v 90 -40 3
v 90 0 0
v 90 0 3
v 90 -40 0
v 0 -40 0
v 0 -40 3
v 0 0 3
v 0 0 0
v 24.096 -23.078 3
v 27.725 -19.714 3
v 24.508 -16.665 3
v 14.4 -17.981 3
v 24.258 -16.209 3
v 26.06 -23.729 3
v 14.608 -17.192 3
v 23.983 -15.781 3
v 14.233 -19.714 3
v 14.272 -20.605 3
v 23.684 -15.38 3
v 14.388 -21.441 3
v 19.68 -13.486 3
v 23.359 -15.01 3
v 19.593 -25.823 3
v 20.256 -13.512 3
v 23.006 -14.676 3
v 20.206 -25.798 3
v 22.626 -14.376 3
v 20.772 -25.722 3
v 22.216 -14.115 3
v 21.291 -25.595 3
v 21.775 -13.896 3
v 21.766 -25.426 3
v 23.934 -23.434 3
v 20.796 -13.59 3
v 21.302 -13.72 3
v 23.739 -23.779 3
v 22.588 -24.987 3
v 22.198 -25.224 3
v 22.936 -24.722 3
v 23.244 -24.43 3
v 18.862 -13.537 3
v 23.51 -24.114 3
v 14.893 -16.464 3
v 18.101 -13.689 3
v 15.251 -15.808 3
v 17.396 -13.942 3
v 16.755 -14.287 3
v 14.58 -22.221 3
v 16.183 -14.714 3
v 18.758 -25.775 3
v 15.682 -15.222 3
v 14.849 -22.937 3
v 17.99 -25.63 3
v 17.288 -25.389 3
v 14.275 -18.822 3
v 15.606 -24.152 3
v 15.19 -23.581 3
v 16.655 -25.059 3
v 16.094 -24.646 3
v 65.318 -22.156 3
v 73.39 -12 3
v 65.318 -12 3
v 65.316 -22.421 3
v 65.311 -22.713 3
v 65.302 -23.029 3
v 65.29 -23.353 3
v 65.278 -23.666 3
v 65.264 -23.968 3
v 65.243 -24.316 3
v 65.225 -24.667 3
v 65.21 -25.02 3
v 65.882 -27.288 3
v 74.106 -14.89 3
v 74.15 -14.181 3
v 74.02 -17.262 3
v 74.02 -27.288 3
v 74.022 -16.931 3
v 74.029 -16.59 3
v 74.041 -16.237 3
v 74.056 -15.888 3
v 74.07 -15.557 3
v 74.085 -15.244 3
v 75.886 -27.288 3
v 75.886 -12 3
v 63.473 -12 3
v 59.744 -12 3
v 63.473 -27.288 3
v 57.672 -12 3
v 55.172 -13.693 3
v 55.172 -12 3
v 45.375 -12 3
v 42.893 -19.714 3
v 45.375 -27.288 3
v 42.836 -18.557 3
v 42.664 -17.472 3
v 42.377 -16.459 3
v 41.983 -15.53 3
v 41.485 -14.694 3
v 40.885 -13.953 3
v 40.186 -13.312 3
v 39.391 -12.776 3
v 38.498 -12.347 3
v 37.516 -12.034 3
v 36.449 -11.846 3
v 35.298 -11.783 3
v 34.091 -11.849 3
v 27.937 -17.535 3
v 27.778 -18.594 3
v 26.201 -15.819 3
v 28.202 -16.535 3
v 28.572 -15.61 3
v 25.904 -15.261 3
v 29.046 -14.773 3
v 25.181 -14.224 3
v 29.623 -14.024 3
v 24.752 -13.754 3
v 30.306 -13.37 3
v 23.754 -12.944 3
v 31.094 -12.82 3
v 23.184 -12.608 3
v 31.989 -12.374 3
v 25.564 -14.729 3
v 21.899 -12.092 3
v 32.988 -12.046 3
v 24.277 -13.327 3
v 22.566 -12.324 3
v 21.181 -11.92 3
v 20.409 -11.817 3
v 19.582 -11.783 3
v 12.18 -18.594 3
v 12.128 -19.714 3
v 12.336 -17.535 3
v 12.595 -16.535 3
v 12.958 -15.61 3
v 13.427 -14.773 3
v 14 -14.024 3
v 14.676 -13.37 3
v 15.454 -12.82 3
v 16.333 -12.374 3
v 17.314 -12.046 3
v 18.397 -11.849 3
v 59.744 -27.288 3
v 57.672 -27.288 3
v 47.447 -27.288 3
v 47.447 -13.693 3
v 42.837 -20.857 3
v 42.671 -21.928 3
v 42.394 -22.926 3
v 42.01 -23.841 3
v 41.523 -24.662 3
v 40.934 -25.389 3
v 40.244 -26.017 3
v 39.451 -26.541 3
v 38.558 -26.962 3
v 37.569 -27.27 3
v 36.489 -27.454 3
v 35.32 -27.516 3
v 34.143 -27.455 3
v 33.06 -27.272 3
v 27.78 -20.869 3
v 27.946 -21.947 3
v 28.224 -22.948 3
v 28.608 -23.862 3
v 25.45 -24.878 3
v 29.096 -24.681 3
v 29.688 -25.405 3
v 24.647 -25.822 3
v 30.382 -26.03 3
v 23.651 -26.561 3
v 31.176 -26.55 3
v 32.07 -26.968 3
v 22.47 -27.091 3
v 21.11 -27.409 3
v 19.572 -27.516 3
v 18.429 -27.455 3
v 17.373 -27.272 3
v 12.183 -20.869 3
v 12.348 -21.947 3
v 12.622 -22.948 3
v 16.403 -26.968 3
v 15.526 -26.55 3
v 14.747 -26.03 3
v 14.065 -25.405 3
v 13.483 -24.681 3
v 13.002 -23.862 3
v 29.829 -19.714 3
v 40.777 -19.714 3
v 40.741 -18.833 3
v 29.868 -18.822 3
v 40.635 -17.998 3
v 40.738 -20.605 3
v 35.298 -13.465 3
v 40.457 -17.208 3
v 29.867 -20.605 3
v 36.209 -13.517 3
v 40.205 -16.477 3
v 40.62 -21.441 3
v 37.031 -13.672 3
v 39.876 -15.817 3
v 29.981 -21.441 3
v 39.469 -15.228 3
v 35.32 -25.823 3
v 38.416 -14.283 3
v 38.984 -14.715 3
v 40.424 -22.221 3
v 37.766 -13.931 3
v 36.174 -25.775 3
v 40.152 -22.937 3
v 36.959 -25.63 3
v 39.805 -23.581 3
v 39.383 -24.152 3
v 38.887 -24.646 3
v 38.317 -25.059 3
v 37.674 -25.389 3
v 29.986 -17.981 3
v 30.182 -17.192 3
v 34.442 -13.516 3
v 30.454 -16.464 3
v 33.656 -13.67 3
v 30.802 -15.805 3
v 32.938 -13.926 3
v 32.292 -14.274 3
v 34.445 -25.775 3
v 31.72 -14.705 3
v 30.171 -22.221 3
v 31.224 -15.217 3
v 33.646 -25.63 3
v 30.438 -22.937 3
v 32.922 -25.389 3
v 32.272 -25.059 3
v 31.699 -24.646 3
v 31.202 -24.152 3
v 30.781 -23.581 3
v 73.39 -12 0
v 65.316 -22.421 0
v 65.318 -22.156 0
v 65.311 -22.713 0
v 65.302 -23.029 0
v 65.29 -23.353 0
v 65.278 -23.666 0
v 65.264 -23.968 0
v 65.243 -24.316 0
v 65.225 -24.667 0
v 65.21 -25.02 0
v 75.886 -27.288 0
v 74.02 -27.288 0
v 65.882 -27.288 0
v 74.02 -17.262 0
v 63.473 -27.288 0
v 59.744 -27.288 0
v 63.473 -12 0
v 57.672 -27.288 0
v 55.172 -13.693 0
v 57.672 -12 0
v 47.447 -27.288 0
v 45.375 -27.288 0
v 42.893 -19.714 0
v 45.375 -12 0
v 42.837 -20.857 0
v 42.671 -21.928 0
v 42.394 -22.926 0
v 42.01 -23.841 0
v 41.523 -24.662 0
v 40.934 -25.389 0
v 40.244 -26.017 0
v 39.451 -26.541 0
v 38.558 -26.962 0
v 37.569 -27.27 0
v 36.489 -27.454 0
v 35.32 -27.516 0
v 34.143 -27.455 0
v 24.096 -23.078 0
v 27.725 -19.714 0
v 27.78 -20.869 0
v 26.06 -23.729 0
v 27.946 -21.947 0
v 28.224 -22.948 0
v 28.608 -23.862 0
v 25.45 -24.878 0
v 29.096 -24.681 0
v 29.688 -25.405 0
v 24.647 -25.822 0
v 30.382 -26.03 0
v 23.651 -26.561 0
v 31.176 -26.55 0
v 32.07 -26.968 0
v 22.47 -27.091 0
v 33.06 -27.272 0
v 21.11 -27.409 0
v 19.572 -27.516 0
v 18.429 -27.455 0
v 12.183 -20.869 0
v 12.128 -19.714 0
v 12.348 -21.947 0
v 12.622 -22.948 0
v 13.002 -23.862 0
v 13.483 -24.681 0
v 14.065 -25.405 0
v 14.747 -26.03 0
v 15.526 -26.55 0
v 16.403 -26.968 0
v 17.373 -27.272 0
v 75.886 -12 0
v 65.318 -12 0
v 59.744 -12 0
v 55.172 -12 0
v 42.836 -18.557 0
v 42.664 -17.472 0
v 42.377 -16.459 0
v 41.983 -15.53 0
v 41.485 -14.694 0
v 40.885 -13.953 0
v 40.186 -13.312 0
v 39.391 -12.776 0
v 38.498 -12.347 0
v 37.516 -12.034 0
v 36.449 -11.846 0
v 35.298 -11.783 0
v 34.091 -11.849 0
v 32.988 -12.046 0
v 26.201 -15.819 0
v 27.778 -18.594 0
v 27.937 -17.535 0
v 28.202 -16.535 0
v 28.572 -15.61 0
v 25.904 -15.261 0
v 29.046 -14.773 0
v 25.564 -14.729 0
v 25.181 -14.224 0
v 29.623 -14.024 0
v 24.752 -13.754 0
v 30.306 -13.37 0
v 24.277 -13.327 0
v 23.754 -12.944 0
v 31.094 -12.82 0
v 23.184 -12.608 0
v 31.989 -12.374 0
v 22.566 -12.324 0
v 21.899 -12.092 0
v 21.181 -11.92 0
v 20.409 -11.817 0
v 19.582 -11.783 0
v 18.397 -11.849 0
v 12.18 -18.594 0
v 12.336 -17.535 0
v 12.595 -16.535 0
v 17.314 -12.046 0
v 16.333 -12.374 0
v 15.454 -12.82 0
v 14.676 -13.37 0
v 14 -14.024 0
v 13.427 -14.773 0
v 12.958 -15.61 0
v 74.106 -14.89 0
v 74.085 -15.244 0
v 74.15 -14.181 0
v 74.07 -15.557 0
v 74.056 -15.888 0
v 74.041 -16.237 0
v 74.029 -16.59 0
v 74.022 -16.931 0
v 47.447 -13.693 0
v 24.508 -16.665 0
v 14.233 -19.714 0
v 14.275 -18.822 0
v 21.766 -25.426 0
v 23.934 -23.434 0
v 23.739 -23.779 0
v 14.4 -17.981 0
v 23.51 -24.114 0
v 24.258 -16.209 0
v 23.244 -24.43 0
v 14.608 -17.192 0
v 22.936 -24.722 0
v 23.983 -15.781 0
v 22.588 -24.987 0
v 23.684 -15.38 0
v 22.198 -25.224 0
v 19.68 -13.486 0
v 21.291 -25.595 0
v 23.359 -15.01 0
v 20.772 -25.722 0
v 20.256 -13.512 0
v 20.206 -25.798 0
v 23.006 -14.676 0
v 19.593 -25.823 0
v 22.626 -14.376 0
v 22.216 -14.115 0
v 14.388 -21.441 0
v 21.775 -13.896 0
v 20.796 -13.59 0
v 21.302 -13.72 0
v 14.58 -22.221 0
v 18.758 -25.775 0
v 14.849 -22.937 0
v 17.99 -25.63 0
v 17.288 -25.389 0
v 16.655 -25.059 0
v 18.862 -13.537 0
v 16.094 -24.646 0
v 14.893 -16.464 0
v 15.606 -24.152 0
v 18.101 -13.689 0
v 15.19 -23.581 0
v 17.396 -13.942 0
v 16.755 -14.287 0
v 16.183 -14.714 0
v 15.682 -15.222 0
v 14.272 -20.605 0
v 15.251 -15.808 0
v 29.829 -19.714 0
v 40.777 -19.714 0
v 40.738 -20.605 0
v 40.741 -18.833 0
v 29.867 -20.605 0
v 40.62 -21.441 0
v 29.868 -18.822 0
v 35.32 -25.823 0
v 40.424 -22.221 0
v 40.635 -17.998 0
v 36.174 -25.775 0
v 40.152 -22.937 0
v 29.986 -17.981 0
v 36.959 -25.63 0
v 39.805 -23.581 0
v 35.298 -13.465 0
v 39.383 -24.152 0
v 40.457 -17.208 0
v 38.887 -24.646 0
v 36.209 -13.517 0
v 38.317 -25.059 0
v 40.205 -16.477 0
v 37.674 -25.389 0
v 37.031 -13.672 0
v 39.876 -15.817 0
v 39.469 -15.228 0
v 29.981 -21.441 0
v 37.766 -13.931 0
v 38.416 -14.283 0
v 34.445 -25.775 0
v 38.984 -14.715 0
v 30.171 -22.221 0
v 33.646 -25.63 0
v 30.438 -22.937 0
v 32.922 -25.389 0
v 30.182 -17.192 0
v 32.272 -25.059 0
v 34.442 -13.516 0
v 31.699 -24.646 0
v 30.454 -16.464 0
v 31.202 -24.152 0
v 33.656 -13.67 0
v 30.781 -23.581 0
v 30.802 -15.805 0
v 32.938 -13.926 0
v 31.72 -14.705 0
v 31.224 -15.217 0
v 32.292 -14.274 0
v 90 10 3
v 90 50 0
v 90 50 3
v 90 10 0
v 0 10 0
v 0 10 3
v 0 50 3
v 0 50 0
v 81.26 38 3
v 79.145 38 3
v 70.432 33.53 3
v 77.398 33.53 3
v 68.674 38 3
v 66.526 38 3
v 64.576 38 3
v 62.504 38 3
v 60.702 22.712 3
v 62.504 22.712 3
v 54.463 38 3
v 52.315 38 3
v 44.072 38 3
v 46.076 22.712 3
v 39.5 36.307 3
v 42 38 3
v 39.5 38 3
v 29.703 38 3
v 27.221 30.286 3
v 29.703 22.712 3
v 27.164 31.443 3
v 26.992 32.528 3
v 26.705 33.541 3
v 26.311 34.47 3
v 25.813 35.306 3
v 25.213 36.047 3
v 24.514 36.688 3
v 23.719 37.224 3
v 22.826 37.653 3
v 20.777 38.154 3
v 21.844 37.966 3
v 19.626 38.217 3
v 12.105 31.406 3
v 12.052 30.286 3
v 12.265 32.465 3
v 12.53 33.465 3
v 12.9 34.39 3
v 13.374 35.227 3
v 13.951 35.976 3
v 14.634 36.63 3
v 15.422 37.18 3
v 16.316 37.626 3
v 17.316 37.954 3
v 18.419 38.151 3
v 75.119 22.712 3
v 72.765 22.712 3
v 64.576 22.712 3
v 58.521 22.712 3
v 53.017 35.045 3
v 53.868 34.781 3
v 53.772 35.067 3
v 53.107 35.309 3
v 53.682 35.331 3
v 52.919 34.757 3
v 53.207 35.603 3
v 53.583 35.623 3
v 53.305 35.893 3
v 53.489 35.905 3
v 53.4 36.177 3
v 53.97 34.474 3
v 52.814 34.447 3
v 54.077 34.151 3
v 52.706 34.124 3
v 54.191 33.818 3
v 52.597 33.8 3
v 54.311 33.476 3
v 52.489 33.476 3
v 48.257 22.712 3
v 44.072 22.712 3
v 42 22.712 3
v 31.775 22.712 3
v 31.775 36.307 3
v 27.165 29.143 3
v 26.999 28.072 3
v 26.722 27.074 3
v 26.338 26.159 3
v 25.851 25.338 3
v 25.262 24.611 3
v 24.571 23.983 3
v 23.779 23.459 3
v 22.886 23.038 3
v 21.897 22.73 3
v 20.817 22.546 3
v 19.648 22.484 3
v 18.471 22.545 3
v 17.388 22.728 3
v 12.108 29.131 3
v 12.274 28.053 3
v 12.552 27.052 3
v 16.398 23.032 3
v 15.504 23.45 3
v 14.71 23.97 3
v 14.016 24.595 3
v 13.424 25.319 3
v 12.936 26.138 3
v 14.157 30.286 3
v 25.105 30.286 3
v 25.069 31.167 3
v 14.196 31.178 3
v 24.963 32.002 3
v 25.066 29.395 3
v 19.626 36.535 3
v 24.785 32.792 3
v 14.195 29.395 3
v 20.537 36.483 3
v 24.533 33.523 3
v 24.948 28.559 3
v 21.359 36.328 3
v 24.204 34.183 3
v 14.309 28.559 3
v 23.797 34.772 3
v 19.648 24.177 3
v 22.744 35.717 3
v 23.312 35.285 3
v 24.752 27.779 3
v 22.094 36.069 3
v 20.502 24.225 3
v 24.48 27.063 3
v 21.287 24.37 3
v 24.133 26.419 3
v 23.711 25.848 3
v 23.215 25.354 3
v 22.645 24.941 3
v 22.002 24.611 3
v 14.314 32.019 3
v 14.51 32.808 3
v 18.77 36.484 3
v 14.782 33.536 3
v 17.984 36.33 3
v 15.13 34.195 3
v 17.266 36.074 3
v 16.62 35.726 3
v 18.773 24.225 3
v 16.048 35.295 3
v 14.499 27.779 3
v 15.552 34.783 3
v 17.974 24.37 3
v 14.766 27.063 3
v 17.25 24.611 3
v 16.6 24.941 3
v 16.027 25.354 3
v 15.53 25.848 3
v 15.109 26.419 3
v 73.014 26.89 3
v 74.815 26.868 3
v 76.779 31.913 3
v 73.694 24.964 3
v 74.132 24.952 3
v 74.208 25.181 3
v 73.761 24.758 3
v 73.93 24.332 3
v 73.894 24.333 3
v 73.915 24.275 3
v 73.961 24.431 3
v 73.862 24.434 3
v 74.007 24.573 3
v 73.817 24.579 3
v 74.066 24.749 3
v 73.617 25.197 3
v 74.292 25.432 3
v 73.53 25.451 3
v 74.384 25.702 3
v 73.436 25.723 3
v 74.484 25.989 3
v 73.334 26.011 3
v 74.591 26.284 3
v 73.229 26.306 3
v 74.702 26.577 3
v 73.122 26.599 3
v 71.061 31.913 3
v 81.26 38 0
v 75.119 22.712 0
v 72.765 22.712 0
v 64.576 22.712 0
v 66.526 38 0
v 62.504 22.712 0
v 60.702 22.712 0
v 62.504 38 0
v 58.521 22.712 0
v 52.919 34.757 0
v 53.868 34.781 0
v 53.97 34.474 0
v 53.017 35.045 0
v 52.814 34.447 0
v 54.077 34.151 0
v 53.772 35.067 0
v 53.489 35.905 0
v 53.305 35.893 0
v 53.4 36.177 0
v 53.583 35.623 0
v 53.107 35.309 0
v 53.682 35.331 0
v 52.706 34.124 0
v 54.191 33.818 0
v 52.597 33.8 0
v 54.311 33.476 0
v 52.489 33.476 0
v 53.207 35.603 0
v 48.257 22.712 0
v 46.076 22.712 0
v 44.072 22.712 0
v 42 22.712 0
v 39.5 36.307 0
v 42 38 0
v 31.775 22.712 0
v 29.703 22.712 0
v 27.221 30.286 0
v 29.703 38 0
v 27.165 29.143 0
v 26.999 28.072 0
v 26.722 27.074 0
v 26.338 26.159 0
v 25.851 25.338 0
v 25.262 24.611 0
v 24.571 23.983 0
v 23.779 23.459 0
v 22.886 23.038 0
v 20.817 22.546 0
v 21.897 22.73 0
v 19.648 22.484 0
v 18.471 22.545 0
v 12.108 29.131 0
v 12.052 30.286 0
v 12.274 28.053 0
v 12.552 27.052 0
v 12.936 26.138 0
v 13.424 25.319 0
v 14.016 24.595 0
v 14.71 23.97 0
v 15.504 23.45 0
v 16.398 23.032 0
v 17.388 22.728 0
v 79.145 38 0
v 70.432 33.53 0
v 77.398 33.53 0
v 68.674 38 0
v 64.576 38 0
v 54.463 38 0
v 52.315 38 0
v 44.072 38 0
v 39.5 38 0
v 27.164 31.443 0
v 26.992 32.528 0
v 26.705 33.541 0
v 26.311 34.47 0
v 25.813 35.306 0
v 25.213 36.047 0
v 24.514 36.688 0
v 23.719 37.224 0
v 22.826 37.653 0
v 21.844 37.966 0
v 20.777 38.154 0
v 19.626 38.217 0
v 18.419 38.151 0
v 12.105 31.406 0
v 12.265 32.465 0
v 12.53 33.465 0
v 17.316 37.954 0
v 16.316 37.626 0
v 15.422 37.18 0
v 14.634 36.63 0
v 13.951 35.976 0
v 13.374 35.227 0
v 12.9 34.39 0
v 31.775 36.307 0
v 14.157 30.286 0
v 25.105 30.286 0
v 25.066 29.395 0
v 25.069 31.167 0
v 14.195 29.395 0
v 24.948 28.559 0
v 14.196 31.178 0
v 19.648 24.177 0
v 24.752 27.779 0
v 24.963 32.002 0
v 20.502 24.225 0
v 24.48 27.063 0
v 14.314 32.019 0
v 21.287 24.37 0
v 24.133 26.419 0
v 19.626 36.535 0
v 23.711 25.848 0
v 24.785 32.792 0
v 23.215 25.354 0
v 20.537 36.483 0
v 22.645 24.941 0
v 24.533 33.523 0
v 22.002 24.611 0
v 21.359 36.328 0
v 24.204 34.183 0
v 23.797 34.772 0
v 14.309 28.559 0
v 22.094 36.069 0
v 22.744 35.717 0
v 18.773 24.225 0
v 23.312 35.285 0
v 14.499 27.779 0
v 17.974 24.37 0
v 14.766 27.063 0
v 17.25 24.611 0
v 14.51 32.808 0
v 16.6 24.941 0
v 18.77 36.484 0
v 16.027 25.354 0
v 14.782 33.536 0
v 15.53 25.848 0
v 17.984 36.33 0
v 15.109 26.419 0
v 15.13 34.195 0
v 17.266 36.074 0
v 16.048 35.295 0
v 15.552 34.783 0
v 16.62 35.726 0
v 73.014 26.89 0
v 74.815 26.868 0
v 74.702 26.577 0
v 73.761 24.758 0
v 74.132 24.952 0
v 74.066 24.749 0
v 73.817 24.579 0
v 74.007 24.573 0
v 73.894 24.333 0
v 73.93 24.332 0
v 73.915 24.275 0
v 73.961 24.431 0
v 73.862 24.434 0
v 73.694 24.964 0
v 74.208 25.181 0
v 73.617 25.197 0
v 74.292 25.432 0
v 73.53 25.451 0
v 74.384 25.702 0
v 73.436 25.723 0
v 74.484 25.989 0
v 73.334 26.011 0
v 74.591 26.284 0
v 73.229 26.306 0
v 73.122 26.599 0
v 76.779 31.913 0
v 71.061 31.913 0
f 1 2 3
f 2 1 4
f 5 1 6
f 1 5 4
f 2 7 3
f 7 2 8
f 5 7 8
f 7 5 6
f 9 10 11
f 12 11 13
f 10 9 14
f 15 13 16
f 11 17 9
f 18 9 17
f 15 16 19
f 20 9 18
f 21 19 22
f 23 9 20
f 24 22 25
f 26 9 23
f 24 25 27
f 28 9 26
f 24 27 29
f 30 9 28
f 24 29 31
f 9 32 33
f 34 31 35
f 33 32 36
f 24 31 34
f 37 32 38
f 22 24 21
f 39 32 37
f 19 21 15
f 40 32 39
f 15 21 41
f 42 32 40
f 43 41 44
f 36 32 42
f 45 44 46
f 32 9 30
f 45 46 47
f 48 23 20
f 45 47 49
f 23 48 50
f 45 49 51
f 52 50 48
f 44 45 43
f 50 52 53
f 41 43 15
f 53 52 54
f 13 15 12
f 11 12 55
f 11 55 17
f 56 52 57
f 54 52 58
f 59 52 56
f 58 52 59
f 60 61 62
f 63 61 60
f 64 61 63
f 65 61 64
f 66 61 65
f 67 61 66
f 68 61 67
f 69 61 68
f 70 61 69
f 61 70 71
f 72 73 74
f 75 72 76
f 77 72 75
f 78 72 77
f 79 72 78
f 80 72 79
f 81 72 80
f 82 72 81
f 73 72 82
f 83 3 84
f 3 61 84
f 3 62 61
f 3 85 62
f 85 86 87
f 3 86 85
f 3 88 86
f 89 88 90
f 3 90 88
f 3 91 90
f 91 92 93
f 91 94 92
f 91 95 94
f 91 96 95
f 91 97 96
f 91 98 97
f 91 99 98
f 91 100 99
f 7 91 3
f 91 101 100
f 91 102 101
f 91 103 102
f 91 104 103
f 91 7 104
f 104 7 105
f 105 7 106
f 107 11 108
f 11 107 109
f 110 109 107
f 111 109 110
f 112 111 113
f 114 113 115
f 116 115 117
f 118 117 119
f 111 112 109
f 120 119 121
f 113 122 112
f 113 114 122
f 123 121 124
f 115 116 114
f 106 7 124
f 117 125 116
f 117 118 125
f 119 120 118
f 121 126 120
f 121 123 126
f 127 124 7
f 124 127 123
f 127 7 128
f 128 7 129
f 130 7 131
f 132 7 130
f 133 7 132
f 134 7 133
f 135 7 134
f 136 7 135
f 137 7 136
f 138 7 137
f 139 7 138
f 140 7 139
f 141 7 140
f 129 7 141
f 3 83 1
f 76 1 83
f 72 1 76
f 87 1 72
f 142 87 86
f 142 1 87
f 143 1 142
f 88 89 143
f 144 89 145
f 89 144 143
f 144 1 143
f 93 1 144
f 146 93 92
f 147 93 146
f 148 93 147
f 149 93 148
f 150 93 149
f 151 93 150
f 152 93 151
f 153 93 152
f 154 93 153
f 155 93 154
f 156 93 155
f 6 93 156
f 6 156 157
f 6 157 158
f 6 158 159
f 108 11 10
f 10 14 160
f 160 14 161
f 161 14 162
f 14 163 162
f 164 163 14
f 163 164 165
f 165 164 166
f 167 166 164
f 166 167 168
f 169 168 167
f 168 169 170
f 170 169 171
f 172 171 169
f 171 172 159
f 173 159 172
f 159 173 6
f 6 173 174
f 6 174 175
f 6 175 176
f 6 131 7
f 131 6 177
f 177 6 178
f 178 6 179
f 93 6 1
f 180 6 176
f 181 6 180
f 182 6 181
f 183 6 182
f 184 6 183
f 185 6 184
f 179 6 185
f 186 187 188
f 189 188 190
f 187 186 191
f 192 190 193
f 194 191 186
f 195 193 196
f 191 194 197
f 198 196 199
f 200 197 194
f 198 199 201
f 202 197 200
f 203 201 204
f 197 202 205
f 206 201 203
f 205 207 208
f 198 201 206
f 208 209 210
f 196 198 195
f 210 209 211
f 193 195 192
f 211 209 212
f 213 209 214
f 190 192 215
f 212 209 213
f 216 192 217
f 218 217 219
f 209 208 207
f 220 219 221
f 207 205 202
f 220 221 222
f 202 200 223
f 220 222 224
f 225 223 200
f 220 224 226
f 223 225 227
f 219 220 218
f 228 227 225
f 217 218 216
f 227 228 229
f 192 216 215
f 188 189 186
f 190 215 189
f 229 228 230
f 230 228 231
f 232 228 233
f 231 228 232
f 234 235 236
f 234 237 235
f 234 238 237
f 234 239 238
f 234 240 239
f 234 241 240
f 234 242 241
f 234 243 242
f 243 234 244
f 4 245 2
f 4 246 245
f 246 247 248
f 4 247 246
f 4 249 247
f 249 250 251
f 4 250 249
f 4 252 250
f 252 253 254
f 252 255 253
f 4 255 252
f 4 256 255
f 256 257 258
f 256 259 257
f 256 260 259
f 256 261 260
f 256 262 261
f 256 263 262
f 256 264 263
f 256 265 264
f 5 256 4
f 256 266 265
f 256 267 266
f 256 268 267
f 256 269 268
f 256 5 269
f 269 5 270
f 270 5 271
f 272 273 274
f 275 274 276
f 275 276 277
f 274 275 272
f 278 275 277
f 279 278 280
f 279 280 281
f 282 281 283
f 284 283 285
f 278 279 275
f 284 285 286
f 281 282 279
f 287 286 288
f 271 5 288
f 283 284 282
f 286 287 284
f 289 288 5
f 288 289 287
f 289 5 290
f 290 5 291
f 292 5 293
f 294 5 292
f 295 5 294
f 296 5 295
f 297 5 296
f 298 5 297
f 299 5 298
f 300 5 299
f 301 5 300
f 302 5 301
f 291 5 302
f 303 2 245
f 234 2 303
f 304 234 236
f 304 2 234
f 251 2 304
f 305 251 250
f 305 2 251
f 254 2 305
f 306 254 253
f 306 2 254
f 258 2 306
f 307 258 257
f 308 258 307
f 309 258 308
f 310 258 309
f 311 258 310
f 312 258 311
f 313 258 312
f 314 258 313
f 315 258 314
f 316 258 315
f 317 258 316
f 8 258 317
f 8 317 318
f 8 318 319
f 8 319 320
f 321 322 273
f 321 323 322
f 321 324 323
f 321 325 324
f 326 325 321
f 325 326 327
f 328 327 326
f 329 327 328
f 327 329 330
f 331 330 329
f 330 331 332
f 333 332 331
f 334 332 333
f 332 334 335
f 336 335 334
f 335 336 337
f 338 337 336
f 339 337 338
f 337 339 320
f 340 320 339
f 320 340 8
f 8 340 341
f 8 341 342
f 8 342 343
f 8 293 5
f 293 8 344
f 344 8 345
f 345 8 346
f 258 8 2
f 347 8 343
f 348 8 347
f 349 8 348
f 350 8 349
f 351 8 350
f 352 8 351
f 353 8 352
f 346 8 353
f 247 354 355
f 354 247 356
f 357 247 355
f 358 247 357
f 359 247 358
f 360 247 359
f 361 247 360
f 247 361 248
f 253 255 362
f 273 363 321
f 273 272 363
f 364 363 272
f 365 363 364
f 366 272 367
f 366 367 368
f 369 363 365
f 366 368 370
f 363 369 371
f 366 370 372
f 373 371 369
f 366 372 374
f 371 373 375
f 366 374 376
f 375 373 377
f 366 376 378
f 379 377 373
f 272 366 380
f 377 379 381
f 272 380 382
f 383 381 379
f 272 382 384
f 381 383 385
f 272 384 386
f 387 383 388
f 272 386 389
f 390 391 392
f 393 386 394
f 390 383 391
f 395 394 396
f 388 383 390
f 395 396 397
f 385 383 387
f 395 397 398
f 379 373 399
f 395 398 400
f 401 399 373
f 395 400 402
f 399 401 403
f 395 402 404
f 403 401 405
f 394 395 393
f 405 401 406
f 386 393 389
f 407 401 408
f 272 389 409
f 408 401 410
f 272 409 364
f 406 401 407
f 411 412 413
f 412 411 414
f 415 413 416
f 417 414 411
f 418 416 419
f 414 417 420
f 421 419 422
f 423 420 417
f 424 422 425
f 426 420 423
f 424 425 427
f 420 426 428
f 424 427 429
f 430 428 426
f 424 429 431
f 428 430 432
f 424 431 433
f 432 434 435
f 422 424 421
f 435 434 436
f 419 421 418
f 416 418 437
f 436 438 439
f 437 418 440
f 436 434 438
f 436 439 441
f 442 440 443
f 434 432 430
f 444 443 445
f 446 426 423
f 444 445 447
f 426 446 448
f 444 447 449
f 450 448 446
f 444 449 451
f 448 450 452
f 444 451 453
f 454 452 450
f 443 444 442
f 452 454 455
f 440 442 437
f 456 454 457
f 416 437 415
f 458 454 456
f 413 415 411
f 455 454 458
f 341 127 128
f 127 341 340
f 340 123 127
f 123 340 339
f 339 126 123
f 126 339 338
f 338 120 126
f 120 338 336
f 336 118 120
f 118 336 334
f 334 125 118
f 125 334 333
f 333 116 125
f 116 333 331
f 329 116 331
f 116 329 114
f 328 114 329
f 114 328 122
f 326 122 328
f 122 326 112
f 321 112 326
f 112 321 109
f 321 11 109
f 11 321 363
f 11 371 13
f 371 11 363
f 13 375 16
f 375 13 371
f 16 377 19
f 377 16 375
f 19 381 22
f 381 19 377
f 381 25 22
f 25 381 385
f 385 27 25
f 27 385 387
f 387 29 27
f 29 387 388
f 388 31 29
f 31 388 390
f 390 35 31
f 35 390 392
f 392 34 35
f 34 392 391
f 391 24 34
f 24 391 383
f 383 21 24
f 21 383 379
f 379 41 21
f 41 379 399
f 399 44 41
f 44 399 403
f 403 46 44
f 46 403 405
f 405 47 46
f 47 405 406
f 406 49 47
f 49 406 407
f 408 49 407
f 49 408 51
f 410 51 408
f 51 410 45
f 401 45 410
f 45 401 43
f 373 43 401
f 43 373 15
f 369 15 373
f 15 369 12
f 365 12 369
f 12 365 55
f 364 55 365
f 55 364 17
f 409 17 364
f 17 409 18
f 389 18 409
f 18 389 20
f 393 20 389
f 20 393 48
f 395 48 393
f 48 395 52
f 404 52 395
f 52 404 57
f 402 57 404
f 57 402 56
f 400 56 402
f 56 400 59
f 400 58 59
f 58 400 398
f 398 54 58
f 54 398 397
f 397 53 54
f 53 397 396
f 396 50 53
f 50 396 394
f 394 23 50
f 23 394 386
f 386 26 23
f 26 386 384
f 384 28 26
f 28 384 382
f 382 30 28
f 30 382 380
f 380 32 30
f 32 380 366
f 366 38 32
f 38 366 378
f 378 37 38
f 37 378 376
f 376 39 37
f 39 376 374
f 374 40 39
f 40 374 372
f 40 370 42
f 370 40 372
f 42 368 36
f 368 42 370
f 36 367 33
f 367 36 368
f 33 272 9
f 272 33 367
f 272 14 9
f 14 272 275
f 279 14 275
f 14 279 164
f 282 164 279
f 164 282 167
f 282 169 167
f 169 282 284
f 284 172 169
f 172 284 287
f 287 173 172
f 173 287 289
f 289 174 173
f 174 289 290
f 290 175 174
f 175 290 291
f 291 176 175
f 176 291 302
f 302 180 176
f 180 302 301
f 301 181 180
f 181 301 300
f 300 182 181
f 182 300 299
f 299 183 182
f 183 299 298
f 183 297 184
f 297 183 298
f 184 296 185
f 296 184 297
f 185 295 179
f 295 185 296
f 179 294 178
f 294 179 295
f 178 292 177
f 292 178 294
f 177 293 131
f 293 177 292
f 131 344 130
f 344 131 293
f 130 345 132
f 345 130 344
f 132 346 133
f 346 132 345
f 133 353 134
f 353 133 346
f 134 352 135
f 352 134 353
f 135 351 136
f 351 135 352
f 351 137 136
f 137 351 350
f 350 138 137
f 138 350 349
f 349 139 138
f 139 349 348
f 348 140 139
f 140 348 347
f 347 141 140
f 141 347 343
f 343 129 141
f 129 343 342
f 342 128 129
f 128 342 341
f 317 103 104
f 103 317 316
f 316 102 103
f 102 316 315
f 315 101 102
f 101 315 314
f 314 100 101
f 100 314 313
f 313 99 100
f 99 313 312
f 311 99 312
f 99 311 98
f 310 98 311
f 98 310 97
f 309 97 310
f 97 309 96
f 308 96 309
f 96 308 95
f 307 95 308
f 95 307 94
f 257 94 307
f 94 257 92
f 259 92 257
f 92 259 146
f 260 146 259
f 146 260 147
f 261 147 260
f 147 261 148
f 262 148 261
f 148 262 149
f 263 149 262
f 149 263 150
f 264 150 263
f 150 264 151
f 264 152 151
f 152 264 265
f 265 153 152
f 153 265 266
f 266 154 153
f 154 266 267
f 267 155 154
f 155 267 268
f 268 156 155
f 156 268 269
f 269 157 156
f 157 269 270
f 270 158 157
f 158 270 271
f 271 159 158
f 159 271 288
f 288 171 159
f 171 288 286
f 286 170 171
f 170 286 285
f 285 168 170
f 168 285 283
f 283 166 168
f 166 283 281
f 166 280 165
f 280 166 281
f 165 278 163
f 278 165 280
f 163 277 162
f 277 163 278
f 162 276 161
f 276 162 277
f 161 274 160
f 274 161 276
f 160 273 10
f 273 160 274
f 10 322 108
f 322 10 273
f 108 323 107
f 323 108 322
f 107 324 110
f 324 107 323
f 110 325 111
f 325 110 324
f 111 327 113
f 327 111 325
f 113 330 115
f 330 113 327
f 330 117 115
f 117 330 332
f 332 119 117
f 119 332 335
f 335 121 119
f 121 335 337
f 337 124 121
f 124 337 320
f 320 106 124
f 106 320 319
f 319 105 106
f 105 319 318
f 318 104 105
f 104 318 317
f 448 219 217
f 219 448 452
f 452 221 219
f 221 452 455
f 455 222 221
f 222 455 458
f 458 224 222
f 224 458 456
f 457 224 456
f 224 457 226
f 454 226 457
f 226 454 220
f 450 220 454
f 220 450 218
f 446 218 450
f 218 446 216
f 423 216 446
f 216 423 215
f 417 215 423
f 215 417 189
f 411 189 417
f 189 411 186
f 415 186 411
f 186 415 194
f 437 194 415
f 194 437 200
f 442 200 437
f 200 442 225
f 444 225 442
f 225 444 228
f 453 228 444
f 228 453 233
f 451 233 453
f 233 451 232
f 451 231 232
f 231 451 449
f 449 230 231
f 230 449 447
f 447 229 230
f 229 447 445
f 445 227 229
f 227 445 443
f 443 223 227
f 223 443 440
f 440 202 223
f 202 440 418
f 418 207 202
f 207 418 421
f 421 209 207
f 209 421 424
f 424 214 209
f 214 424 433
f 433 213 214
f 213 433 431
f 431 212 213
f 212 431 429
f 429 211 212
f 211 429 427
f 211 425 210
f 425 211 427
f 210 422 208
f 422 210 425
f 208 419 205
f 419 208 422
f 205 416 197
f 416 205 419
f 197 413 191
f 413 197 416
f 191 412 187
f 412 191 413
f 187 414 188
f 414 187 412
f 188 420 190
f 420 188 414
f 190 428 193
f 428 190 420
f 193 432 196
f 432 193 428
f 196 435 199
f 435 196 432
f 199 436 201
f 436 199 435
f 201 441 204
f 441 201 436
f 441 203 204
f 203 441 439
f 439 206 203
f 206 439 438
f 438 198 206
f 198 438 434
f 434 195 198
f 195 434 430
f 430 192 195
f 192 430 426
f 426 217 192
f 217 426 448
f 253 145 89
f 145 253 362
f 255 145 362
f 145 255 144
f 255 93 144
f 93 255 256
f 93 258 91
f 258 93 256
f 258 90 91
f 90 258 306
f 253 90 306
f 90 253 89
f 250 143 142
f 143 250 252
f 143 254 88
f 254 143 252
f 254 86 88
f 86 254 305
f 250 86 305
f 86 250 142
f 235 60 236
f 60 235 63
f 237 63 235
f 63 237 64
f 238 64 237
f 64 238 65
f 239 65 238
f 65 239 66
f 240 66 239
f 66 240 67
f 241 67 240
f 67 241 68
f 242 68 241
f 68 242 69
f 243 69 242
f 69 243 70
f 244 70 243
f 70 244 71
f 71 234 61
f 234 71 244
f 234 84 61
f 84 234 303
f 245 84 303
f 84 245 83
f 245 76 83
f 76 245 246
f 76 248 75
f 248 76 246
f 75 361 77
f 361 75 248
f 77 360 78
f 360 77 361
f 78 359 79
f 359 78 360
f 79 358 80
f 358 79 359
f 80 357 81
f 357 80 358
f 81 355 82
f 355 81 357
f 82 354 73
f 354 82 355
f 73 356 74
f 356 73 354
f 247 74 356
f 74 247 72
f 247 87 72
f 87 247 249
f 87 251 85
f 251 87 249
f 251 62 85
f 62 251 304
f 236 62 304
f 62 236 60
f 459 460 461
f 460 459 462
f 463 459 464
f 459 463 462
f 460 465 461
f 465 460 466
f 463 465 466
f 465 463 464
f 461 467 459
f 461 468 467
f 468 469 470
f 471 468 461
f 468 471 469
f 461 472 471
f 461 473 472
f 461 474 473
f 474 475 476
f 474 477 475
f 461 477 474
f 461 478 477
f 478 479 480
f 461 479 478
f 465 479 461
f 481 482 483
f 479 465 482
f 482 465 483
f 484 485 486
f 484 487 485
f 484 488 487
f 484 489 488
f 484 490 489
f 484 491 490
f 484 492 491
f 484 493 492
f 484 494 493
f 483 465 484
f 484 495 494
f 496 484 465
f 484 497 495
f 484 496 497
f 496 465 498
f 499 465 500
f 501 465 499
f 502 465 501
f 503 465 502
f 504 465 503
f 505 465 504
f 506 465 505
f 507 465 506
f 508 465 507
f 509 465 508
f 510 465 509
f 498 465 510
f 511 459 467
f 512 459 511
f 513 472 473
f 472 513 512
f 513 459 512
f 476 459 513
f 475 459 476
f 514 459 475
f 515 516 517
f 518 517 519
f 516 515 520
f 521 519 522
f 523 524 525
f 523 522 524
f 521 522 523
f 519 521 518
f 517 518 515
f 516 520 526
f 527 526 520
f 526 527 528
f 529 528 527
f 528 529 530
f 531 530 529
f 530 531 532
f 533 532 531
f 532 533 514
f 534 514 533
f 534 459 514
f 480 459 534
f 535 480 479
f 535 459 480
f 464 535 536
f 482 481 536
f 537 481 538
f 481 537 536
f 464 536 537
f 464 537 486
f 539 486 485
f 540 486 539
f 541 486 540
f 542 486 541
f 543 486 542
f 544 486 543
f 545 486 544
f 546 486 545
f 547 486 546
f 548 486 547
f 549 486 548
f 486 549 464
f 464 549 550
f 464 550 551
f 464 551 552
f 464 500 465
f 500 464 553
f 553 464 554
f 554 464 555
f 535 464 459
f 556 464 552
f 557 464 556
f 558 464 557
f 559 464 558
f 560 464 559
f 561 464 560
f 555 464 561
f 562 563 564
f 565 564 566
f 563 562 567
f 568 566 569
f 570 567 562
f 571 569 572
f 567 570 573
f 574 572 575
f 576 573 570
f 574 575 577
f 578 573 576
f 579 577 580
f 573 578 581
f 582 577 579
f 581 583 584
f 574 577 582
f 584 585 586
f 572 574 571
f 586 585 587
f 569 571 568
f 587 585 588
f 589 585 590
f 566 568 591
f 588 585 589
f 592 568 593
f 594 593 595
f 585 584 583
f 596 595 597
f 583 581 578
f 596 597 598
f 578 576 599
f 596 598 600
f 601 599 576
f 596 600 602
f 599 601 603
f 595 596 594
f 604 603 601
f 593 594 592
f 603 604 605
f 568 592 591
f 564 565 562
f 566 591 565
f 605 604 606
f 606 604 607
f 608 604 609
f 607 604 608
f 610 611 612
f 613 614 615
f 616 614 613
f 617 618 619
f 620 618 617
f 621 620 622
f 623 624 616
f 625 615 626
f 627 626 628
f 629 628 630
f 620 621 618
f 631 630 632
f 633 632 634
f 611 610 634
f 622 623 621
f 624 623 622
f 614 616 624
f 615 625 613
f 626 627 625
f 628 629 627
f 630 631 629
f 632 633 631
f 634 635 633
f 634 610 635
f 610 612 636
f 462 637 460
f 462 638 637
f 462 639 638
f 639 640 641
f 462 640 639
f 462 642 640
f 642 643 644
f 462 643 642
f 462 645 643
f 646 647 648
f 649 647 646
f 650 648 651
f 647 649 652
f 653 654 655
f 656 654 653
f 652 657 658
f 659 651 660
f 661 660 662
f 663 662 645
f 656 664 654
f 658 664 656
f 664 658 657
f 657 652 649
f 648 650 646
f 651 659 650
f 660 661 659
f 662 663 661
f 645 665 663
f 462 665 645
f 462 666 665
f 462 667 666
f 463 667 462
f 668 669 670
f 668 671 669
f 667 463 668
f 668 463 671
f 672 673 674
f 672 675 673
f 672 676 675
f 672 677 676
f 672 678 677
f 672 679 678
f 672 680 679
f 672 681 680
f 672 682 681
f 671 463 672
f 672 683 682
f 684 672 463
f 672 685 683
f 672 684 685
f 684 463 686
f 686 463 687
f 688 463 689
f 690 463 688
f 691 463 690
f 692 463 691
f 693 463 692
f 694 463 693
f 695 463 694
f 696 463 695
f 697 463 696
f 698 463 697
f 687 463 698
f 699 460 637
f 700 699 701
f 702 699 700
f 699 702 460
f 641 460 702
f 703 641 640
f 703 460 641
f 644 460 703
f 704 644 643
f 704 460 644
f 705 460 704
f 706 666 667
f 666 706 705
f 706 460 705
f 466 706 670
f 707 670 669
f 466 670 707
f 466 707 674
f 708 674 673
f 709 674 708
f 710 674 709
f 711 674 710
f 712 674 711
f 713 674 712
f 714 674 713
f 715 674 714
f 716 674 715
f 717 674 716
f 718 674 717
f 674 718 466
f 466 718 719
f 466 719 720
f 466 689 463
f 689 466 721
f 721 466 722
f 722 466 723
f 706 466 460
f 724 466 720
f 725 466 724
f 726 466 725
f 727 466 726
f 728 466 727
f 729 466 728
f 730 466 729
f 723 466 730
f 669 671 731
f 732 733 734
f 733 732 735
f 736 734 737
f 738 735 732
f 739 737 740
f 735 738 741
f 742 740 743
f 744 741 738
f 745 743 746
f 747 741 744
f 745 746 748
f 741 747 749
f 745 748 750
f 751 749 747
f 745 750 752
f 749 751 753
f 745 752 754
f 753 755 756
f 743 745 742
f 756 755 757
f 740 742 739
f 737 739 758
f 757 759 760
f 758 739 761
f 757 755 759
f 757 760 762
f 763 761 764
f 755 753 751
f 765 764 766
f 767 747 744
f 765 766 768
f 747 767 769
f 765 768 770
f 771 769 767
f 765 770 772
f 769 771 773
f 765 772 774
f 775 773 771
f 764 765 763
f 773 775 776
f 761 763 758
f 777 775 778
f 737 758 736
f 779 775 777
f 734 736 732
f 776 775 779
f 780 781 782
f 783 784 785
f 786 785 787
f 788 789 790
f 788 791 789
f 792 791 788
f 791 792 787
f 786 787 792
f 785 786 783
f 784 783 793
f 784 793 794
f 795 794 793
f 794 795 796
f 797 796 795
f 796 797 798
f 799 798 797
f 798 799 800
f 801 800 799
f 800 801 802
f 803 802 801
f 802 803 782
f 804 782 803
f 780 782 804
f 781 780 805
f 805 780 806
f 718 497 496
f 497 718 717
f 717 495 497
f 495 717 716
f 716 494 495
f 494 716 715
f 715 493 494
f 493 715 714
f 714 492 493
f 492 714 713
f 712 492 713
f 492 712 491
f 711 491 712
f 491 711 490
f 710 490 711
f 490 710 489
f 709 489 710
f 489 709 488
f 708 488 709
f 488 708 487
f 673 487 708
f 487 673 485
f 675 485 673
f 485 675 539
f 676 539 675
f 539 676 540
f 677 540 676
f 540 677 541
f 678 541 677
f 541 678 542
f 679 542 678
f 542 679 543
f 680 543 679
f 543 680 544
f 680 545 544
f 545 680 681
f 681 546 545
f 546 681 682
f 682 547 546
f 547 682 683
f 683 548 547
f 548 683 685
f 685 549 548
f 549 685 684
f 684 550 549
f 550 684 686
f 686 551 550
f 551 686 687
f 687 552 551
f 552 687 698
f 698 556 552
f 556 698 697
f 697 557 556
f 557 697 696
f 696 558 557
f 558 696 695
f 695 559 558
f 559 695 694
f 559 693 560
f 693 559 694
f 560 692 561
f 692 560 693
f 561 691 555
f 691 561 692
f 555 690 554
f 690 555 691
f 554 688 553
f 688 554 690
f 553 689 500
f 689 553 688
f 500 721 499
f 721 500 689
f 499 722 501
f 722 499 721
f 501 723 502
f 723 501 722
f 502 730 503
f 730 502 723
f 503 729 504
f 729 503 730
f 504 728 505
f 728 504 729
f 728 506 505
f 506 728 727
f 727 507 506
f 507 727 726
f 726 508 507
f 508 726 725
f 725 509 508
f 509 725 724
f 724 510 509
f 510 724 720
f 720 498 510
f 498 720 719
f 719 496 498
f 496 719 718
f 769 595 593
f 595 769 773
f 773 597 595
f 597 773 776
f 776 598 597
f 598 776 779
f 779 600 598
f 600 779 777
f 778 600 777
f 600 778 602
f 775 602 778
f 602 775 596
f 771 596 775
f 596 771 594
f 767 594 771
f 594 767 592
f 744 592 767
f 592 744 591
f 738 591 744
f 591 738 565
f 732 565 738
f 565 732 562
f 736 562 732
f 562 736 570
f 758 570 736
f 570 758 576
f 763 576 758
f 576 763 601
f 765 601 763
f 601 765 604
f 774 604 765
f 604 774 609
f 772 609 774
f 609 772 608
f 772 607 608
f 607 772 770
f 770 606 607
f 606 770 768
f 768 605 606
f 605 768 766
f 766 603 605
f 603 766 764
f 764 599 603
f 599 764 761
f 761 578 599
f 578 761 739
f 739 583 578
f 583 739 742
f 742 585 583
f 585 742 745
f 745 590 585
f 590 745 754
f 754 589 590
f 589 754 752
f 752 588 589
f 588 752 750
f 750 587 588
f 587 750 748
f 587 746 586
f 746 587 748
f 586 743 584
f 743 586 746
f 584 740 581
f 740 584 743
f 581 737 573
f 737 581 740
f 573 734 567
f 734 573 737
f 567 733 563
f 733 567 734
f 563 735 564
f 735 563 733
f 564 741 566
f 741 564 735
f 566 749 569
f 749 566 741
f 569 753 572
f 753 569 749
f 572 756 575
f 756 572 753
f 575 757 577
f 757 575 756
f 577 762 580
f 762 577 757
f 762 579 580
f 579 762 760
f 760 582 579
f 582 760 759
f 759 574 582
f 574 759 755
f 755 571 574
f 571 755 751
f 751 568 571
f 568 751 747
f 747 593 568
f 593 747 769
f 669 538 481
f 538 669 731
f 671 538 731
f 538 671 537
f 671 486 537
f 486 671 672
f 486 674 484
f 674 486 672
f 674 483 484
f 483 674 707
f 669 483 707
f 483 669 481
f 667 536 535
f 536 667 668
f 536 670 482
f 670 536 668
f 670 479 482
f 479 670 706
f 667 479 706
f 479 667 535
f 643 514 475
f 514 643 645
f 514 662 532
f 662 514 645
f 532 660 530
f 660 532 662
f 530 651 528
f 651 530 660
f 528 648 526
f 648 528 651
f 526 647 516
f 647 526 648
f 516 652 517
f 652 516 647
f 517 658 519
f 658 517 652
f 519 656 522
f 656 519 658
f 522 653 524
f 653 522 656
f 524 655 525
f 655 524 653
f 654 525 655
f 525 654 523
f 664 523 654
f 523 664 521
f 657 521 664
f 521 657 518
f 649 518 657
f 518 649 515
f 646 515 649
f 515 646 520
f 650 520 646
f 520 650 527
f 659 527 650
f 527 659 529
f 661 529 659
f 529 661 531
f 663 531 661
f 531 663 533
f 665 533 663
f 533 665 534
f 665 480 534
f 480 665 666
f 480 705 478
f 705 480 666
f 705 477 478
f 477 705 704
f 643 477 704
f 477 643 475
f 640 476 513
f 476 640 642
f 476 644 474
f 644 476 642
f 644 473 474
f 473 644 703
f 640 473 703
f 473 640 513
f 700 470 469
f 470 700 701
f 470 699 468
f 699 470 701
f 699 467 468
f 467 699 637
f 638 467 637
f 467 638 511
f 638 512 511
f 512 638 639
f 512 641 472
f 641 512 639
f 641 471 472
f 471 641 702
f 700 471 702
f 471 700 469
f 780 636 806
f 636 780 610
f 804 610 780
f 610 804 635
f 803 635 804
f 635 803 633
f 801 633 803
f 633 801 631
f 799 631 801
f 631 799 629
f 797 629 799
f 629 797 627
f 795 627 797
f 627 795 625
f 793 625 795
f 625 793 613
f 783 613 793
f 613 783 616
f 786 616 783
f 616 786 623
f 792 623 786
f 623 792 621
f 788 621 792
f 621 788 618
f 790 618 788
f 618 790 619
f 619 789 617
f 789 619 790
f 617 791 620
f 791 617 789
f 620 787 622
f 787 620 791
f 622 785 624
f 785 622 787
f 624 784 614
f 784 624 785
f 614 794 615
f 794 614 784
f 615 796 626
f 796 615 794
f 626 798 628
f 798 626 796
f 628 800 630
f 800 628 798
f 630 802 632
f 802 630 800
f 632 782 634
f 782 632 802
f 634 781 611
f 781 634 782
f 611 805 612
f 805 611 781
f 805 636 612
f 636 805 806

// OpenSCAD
// Set the initial viewport parameters
$vpr = [90, 0, 0];
$vpt = [50, 0, 0];
$vpd = 344;

rotate([90, 0, 0]) {
    difference() {
        cube([90, 3, 40]);
     translate([11, 6, 2]) { 
            translate([0, 0, 10]) t("COLIN", s = 16, spacing = 1);
    //        translate([0, 0, 4])   t("OLIVIA" , s = 8, spacing = 1);
    //        translate([0, 0, -2])   t("保罗", s = 8, spacing = 1,     font="Noto Serif CJK SC");
        } 
    }
}

translate([0, 50, 0]) { 
rotate([90, 0, 0]) {
    difference() {
        cube([90, 3, 40]);
     translate([11, 6, 2]) { 
//            translate([0, 0, 10]) t("COLIN", s = 16, spacing = 1);
            translate([0, 0, 10])   t("OLIVIA" , s = 16, spacing = 1);
    //        translate([0, 0, -2])   t("保罗", s = 8, spacing = 1,     font="Noto Serif CJK SC");
        } 
    }
}
}





// Helper to create 3D text with correct font and orientation
module t(t, s = 18, style = ":style=Bold", spacing = 1, font = "Liberation Sans") {
  rotate([90, 0, 0])
    linear_extrude(height = 10)
      text(t, size = s,
           spacing=spacing,
           font=font,
           $fn = 16);
}

// Color helpers
module green() color([157/255,203/255,81/255]) children();
module corn() color([249/255,210/255,44/255]) children();
module black() color([0, 0, 0]) children();

echo(version=version());
// Written in 2014 by Torsten Paul <Torsten.Paul@gmx.de>
//
// To the extent possible under law, the author(s) have dedicated all
// copyright and related and neighboring rights to this software to the
// public domain worldwide. This software is distributed without any
// warranty.
//
// You should have received a copy of the CC0 Public Domain
// Dedication along with this software.
// If not, see <http://creativecommons.org/publicdomain/zero/1.0/>.
